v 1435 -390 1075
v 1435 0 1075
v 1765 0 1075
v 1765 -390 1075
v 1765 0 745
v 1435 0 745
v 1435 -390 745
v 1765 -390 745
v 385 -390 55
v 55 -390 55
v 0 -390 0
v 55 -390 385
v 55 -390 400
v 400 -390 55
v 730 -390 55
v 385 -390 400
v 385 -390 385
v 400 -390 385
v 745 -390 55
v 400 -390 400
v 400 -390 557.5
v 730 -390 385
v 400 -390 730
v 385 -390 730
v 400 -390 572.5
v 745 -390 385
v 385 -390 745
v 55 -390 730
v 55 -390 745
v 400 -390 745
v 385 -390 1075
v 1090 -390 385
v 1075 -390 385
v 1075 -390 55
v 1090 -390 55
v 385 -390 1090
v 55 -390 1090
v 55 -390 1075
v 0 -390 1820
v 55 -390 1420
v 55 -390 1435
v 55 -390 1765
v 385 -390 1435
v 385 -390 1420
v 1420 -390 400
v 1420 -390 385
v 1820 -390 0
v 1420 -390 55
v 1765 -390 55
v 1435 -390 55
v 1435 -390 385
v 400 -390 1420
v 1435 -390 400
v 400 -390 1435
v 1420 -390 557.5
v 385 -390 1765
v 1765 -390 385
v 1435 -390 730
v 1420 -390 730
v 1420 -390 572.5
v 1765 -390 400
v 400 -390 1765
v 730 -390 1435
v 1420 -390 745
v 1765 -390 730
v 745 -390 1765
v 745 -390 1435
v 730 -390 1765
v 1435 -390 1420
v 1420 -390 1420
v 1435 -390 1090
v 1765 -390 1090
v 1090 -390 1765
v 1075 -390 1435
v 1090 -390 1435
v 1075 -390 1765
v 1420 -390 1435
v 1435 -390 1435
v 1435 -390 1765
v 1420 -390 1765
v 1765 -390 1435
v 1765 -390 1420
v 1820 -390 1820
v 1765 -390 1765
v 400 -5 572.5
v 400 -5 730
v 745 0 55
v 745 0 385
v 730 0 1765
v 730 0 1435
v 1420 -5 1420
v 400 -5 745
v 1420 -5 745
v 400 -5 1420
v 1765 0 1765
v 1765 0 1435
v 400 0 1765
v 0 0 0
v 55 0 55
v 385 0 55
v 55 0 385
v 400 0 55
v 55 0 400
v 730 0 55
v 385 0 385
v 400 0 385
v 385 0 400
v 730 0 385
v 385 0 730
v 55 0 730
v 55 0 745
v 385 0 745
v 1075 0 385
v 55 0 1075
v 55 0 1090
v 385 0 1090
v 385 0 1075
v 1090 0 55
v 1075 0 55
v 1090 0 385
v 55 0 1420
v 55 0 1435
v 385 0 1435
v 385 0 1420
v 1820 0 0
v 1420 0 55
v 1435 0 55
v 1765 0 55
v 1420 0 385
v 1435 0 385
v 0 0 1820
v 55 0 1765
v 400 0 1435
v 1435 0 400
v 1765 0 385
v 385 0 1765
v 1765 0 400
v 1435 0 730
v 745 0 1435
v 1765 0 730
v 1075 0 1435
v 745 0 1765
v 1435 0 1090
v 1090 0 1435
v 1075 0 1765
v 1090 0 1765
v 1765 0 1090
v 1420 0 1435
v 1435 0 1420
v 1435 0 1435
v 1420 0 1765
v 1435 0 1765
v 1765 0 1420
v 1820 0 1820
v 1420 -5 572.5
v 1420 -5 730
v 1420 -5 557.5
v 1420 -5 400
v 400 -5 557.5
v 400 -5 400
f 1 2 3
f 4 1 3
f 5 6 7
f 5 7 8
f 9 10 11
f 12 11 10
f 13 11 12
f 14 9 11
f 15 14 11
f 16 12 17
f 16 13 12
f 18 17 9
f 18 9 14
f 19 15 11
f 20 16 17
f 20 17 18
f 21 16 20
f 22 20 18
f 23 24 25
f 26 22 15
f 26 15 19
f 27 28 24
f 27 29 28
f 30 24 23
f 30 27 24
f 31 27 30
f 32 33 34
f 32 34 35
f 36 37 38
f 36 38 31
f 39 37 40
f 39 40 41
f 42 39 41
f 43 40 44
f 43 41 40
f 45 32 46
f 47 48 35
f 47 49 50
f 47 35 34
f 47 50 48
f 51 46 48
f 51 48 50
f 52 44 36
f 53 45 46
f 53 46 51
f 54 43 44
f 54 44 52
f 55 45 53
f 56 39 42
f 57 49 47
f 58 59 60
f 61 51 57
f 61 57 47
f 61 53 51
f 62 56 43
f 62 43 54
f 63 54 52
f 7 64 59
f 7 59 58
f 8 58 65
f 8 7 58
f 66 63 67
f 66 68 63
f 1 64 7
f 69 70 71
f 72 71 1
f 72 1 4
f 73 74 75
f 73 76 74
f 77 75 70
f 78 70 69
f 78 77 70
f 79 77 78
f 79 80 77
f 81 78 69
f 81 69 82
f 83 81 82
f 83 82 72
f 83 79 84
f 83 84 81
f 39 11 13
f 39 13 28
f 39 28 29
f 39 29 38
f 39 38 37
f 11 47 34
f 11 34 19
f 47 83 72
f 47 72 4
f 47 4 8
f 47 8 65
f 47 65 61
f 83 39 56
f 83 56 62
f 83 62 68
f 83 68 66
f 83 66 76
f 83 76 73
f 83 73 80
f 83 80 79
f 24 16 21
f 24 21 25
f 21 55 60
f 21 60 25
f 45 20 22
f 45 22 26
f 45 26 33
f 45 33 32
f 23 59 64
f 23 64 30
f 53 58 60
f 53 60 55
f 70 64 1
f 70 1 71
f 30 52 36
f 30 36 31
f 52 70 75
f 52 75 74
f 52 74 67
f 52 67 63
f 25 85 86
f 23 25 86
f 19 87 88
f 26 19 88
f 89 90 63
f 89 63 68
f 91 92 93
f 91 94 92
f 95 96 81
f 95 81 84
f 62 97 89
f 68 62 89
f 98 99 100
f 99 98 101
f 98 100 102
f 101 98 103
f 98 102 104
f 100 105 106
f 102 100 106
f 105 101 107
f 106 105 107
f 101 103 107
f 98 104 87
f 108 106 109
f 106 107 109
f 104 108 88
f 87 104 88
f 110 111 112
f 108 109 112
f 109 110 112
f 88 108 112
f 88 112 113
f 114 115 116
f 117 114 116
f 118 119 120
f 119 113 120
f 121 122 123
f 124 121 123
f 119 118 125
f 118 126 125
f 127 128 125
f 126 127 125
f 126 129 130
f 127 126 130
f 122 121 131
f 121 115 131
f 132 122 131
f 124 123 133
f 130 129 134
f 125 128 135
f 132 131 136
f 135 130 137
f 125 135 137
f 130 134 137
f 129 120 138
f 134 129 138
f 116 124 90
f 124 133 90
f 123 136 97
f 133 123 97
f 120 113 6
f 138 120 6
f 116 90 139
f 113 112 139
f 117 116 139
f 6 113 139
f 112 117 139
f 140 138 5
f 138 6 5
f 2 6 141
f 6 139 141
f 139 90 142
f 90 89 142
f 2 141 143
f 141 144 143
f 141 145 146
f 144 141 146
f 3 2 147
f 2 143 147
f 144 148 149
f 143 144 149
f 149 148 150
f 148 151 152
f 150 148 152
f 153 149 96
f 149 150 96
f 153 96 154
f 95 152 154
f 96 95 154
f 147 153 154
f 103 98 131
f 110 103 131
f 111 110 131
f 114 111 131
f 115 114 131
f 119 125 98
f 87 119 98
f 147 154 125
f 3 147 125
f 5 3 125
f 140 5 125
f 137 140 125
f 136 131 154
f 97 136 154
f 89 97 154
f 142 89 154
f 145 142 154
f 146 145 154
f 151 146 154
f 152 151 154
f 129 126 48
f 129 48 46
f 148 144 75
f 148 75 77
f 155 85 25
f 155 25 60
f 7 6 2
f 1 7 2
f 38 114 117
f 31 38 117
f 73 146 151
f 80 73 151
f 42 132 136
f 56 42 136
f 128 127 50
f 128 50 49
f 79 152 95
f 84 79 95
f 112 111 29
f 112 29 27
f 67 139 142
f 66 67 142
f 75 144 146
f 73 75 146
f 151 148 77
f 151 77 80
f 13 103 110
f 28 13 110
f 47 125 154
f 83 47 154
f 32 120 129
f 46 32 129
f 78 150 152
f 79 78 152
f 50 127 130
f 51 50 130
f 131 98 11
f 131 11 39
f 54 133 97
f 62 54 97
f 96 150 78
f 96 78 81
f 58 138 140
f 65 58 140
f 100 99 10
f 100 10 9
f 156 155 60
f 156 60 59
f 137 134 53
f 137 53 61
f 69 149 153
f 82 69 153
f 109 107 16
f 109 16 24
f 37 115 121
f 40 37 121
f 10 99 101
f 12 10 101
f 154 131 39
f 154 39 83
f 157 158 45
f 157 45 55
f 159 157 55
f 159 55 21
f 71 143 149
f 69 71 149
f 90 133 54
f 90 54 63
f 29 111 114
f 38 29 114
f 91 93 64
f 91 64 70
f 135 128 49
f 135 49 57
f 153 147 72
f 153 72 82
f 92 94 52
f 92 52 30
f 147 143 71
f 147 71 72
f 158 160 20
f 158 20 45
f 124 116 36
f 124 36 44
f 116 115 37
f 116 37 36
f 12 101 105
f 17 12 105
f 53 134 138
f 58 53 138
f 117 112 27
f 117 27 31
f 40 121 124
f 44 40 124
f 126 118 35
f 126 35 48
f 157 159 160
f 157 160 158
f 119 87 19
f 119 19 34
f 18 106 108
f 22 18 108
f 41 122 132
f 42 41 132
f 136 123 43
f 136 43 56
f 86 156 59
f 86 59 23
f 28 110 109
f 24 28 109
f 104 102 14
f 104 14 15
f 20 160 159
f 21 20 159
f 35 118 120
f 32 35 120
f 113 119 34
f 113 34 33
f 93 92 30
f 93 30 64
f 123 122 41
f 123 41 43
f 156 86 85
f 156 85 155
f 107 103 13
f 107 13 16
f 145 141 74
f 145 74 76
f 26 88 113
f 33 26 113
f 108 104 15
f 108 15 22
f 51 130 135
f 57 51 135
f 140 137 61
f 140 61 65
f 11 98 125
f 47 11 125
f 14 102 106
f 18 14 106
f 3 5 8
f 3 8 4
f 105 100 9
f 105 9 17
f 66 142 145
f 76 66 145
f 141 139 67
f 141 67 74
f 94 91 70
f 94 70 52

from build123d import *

# Parameters (mm, degrees)
F0_W     = 1820
F0_H     = 1820
F1_DEPTH = 390
F2_W     = 330
F2_H     = 330
F2_H_2   = 157.5
F2_W_2   = 15
F3_DEPTH = 740.61349
F4_DEPTH = 5


with BuildPart() as f1:
    # F0 (on Front) → F1 (new body)
    with BuildSketch(Plane.XZ):
        with Locations((910, 910)):
            Rectangle(F0_W, F0_H)
    extrude(amount=F1_DEPTH)

    # F2 (on Front) → F3 (cut)
    with BuildSketch(Plane.XZ):
        with Locations((220, 220)):
            Rectangle(F2_W, F2_H)
        with Locations((220, 565)):
            Rectangle(F2_W, F2_H)
        with Locations((220, 910)):
            Rectangle(F2_W, F2_H)
        with Locations((220, 1255)):
            Rectangle(F2_W, F2_H)
        with Locations((220, 1600)):
            Rectangle(F2_W, F2_H)
        with Locations((565, 220)):
            Rectangle(F2_W, F2_H)
        with Locations((565, 1600)):
            Rectangle(F2_W, F2_H)
        with Locations((910, 220)):
            Rectangle(F2_W, F2_H)
        with Locations((910, 1600)):
            Rectangle(F2_W, F2_H)
        with Locations((1255, 220)):
            Rectangle(F2_W, F2_H)
        with Locations((1255, 1600)):
            Rectangle(F2_W, F2_H)
        with Locations((1600, 220)):
            Rectangle(F2_W, F2_H)
        with Locations((1600, 565)):
            Rectangle(F2_W, F2_H)
        with Locations((1600, 910)):
            Rectangle(F2_W, F2_H)
        with Locations((1600, 1255)):
            Rectangle(F2_W, F2_H)
        with Locations((1600, 1600)):
            Rectangle(F2_W, F2_H)
        with Locations((565, 910)):
            Rectangle(F2_W, F2_H)
        with Locations((565, 1255)):
            Rectangle(F2_W, F2_H)
        with Locations((910, 910)):
            Rectangle(F2_W, F2_H)
        with Locations((910, 1255)):
            Rectangle(F2_W, F2_H)
        with Locations((1255, 910)):
            Rectangle(F2_W, F2_H)
        with Locations((1255, 1255)):
            Rectangle(F2_W, F2_H)
        with Locations((565, 651.25)):
            Rectangle(F2_W, F2_H_2)
        with Locations((565, 478.75)):
            Rectangle(F2_W, F2_H_2)
        with Locations((1255, 651.25)):
            Rectangle(F2_W, F2_H_2)
        with Locations((1255, 478.75)):
            Rectangle(F2_W, F2_H_2)
        with Locations((737.5, 651.25)):
            Rectangle(F2_W_2, F2_H_2)
        with Locations((737.5, 478.75)):
            Rectangle(F2_W_2, F2_H_2)
        with Locations((910, 651.25)):
            Rectangle(F2_W, F2_H_2)
        with Locations((1082.5, 651.25)):
            Rectangle(F2_W_2, F2_H_2)
        with Locations((910, 478.75)):
            Rectangle(F2_W, F2_H_2)
        with Locations((1082.5, 478.75)):
            Rectangle(F2_W_2, F2_H_2)
        Polygon((400, 1075), (730, 1075), (730, 745), (745, 745), (745, 1075), (1075, 1075), (1075, 745), (1090, 745), (1090, 1075), (1420, 1075), (1420, 1090), (1090, 1090), (1090, 1420), (1075, 1420), (1075, 1090), (745, 1090), (745, 1420), (730, 1420), (730, 1090), (400, 1090), align=None)
    extrude(amount=F3_DEPTH, mode=Mode.SUBTRACT)

    # F2 (on Front) → F4 (join)
    with BuildSketch(Plane.XZ):
        with Locations((565, 478.75)):
            Rectangle(F2_W, F2_H_2)
        with Locations((565, 651.25)):
            Rectangle(F2_W, F2_H_2)
        with Locations((910, 651.25)):
            Rectangle(F2_W, F2_H_2)
        with Locations((910, 478.75)):
            Rectangle(F2_W, F2_H_2)
        with Locations((1255, 478.75)):
            Rectangle(F2_W, F2_H_2)
        with Locations((1255, 651.25)):
            Rectangle(F2_W, F2_H_2)
        with Locations((565, 910)):
            Rectangle(F2_W, F2_H)
        with Locations((1255, 910)):
            Rectangle(F2_W, F2_H)
        with Locations((1255, 1255)):
            Rectangle(F2_W, F2_H)
        with Locations((910, 1255)):
            Rectangle(F2_W, F2_H)
        with Locations((565, 1255)):
            Rectangle(F2_W, F2_H)
        with Locations((910, 910)):
            Rectangle(F2_W, F2_H)
        Polygon((400, 1075), (730, 1075), (730, 745), (745, 745), (745, 1075), (1075, 1075), (1075, 745), (1090, 745), (1090, 1075), (1420, 1075), (1420, 1090), (1090, 1090), (1090, 1420), (1075, 1420), (1075, 1090), (745, 1090), (745, 1420), (730, 1420), (730, 1090), (400, 1090), align=None)
        with Locations((737.5, 651.25)):
            Rectangle(F2_W_2, F2_H_2)
        with Locations((737.5, 478.75)):
            Rectangle(F2_W_2, F2_H_2)
        with Locations((1082.5, 478.75)):
            Rectangle(F2_W_2, F2_H_2)
        with Locations((1082.5, 651.25)):
            Rectangle(F2_W_2, F2_H_2)
    extrude(amount=F4_DEPTH)


solid = f1.part
